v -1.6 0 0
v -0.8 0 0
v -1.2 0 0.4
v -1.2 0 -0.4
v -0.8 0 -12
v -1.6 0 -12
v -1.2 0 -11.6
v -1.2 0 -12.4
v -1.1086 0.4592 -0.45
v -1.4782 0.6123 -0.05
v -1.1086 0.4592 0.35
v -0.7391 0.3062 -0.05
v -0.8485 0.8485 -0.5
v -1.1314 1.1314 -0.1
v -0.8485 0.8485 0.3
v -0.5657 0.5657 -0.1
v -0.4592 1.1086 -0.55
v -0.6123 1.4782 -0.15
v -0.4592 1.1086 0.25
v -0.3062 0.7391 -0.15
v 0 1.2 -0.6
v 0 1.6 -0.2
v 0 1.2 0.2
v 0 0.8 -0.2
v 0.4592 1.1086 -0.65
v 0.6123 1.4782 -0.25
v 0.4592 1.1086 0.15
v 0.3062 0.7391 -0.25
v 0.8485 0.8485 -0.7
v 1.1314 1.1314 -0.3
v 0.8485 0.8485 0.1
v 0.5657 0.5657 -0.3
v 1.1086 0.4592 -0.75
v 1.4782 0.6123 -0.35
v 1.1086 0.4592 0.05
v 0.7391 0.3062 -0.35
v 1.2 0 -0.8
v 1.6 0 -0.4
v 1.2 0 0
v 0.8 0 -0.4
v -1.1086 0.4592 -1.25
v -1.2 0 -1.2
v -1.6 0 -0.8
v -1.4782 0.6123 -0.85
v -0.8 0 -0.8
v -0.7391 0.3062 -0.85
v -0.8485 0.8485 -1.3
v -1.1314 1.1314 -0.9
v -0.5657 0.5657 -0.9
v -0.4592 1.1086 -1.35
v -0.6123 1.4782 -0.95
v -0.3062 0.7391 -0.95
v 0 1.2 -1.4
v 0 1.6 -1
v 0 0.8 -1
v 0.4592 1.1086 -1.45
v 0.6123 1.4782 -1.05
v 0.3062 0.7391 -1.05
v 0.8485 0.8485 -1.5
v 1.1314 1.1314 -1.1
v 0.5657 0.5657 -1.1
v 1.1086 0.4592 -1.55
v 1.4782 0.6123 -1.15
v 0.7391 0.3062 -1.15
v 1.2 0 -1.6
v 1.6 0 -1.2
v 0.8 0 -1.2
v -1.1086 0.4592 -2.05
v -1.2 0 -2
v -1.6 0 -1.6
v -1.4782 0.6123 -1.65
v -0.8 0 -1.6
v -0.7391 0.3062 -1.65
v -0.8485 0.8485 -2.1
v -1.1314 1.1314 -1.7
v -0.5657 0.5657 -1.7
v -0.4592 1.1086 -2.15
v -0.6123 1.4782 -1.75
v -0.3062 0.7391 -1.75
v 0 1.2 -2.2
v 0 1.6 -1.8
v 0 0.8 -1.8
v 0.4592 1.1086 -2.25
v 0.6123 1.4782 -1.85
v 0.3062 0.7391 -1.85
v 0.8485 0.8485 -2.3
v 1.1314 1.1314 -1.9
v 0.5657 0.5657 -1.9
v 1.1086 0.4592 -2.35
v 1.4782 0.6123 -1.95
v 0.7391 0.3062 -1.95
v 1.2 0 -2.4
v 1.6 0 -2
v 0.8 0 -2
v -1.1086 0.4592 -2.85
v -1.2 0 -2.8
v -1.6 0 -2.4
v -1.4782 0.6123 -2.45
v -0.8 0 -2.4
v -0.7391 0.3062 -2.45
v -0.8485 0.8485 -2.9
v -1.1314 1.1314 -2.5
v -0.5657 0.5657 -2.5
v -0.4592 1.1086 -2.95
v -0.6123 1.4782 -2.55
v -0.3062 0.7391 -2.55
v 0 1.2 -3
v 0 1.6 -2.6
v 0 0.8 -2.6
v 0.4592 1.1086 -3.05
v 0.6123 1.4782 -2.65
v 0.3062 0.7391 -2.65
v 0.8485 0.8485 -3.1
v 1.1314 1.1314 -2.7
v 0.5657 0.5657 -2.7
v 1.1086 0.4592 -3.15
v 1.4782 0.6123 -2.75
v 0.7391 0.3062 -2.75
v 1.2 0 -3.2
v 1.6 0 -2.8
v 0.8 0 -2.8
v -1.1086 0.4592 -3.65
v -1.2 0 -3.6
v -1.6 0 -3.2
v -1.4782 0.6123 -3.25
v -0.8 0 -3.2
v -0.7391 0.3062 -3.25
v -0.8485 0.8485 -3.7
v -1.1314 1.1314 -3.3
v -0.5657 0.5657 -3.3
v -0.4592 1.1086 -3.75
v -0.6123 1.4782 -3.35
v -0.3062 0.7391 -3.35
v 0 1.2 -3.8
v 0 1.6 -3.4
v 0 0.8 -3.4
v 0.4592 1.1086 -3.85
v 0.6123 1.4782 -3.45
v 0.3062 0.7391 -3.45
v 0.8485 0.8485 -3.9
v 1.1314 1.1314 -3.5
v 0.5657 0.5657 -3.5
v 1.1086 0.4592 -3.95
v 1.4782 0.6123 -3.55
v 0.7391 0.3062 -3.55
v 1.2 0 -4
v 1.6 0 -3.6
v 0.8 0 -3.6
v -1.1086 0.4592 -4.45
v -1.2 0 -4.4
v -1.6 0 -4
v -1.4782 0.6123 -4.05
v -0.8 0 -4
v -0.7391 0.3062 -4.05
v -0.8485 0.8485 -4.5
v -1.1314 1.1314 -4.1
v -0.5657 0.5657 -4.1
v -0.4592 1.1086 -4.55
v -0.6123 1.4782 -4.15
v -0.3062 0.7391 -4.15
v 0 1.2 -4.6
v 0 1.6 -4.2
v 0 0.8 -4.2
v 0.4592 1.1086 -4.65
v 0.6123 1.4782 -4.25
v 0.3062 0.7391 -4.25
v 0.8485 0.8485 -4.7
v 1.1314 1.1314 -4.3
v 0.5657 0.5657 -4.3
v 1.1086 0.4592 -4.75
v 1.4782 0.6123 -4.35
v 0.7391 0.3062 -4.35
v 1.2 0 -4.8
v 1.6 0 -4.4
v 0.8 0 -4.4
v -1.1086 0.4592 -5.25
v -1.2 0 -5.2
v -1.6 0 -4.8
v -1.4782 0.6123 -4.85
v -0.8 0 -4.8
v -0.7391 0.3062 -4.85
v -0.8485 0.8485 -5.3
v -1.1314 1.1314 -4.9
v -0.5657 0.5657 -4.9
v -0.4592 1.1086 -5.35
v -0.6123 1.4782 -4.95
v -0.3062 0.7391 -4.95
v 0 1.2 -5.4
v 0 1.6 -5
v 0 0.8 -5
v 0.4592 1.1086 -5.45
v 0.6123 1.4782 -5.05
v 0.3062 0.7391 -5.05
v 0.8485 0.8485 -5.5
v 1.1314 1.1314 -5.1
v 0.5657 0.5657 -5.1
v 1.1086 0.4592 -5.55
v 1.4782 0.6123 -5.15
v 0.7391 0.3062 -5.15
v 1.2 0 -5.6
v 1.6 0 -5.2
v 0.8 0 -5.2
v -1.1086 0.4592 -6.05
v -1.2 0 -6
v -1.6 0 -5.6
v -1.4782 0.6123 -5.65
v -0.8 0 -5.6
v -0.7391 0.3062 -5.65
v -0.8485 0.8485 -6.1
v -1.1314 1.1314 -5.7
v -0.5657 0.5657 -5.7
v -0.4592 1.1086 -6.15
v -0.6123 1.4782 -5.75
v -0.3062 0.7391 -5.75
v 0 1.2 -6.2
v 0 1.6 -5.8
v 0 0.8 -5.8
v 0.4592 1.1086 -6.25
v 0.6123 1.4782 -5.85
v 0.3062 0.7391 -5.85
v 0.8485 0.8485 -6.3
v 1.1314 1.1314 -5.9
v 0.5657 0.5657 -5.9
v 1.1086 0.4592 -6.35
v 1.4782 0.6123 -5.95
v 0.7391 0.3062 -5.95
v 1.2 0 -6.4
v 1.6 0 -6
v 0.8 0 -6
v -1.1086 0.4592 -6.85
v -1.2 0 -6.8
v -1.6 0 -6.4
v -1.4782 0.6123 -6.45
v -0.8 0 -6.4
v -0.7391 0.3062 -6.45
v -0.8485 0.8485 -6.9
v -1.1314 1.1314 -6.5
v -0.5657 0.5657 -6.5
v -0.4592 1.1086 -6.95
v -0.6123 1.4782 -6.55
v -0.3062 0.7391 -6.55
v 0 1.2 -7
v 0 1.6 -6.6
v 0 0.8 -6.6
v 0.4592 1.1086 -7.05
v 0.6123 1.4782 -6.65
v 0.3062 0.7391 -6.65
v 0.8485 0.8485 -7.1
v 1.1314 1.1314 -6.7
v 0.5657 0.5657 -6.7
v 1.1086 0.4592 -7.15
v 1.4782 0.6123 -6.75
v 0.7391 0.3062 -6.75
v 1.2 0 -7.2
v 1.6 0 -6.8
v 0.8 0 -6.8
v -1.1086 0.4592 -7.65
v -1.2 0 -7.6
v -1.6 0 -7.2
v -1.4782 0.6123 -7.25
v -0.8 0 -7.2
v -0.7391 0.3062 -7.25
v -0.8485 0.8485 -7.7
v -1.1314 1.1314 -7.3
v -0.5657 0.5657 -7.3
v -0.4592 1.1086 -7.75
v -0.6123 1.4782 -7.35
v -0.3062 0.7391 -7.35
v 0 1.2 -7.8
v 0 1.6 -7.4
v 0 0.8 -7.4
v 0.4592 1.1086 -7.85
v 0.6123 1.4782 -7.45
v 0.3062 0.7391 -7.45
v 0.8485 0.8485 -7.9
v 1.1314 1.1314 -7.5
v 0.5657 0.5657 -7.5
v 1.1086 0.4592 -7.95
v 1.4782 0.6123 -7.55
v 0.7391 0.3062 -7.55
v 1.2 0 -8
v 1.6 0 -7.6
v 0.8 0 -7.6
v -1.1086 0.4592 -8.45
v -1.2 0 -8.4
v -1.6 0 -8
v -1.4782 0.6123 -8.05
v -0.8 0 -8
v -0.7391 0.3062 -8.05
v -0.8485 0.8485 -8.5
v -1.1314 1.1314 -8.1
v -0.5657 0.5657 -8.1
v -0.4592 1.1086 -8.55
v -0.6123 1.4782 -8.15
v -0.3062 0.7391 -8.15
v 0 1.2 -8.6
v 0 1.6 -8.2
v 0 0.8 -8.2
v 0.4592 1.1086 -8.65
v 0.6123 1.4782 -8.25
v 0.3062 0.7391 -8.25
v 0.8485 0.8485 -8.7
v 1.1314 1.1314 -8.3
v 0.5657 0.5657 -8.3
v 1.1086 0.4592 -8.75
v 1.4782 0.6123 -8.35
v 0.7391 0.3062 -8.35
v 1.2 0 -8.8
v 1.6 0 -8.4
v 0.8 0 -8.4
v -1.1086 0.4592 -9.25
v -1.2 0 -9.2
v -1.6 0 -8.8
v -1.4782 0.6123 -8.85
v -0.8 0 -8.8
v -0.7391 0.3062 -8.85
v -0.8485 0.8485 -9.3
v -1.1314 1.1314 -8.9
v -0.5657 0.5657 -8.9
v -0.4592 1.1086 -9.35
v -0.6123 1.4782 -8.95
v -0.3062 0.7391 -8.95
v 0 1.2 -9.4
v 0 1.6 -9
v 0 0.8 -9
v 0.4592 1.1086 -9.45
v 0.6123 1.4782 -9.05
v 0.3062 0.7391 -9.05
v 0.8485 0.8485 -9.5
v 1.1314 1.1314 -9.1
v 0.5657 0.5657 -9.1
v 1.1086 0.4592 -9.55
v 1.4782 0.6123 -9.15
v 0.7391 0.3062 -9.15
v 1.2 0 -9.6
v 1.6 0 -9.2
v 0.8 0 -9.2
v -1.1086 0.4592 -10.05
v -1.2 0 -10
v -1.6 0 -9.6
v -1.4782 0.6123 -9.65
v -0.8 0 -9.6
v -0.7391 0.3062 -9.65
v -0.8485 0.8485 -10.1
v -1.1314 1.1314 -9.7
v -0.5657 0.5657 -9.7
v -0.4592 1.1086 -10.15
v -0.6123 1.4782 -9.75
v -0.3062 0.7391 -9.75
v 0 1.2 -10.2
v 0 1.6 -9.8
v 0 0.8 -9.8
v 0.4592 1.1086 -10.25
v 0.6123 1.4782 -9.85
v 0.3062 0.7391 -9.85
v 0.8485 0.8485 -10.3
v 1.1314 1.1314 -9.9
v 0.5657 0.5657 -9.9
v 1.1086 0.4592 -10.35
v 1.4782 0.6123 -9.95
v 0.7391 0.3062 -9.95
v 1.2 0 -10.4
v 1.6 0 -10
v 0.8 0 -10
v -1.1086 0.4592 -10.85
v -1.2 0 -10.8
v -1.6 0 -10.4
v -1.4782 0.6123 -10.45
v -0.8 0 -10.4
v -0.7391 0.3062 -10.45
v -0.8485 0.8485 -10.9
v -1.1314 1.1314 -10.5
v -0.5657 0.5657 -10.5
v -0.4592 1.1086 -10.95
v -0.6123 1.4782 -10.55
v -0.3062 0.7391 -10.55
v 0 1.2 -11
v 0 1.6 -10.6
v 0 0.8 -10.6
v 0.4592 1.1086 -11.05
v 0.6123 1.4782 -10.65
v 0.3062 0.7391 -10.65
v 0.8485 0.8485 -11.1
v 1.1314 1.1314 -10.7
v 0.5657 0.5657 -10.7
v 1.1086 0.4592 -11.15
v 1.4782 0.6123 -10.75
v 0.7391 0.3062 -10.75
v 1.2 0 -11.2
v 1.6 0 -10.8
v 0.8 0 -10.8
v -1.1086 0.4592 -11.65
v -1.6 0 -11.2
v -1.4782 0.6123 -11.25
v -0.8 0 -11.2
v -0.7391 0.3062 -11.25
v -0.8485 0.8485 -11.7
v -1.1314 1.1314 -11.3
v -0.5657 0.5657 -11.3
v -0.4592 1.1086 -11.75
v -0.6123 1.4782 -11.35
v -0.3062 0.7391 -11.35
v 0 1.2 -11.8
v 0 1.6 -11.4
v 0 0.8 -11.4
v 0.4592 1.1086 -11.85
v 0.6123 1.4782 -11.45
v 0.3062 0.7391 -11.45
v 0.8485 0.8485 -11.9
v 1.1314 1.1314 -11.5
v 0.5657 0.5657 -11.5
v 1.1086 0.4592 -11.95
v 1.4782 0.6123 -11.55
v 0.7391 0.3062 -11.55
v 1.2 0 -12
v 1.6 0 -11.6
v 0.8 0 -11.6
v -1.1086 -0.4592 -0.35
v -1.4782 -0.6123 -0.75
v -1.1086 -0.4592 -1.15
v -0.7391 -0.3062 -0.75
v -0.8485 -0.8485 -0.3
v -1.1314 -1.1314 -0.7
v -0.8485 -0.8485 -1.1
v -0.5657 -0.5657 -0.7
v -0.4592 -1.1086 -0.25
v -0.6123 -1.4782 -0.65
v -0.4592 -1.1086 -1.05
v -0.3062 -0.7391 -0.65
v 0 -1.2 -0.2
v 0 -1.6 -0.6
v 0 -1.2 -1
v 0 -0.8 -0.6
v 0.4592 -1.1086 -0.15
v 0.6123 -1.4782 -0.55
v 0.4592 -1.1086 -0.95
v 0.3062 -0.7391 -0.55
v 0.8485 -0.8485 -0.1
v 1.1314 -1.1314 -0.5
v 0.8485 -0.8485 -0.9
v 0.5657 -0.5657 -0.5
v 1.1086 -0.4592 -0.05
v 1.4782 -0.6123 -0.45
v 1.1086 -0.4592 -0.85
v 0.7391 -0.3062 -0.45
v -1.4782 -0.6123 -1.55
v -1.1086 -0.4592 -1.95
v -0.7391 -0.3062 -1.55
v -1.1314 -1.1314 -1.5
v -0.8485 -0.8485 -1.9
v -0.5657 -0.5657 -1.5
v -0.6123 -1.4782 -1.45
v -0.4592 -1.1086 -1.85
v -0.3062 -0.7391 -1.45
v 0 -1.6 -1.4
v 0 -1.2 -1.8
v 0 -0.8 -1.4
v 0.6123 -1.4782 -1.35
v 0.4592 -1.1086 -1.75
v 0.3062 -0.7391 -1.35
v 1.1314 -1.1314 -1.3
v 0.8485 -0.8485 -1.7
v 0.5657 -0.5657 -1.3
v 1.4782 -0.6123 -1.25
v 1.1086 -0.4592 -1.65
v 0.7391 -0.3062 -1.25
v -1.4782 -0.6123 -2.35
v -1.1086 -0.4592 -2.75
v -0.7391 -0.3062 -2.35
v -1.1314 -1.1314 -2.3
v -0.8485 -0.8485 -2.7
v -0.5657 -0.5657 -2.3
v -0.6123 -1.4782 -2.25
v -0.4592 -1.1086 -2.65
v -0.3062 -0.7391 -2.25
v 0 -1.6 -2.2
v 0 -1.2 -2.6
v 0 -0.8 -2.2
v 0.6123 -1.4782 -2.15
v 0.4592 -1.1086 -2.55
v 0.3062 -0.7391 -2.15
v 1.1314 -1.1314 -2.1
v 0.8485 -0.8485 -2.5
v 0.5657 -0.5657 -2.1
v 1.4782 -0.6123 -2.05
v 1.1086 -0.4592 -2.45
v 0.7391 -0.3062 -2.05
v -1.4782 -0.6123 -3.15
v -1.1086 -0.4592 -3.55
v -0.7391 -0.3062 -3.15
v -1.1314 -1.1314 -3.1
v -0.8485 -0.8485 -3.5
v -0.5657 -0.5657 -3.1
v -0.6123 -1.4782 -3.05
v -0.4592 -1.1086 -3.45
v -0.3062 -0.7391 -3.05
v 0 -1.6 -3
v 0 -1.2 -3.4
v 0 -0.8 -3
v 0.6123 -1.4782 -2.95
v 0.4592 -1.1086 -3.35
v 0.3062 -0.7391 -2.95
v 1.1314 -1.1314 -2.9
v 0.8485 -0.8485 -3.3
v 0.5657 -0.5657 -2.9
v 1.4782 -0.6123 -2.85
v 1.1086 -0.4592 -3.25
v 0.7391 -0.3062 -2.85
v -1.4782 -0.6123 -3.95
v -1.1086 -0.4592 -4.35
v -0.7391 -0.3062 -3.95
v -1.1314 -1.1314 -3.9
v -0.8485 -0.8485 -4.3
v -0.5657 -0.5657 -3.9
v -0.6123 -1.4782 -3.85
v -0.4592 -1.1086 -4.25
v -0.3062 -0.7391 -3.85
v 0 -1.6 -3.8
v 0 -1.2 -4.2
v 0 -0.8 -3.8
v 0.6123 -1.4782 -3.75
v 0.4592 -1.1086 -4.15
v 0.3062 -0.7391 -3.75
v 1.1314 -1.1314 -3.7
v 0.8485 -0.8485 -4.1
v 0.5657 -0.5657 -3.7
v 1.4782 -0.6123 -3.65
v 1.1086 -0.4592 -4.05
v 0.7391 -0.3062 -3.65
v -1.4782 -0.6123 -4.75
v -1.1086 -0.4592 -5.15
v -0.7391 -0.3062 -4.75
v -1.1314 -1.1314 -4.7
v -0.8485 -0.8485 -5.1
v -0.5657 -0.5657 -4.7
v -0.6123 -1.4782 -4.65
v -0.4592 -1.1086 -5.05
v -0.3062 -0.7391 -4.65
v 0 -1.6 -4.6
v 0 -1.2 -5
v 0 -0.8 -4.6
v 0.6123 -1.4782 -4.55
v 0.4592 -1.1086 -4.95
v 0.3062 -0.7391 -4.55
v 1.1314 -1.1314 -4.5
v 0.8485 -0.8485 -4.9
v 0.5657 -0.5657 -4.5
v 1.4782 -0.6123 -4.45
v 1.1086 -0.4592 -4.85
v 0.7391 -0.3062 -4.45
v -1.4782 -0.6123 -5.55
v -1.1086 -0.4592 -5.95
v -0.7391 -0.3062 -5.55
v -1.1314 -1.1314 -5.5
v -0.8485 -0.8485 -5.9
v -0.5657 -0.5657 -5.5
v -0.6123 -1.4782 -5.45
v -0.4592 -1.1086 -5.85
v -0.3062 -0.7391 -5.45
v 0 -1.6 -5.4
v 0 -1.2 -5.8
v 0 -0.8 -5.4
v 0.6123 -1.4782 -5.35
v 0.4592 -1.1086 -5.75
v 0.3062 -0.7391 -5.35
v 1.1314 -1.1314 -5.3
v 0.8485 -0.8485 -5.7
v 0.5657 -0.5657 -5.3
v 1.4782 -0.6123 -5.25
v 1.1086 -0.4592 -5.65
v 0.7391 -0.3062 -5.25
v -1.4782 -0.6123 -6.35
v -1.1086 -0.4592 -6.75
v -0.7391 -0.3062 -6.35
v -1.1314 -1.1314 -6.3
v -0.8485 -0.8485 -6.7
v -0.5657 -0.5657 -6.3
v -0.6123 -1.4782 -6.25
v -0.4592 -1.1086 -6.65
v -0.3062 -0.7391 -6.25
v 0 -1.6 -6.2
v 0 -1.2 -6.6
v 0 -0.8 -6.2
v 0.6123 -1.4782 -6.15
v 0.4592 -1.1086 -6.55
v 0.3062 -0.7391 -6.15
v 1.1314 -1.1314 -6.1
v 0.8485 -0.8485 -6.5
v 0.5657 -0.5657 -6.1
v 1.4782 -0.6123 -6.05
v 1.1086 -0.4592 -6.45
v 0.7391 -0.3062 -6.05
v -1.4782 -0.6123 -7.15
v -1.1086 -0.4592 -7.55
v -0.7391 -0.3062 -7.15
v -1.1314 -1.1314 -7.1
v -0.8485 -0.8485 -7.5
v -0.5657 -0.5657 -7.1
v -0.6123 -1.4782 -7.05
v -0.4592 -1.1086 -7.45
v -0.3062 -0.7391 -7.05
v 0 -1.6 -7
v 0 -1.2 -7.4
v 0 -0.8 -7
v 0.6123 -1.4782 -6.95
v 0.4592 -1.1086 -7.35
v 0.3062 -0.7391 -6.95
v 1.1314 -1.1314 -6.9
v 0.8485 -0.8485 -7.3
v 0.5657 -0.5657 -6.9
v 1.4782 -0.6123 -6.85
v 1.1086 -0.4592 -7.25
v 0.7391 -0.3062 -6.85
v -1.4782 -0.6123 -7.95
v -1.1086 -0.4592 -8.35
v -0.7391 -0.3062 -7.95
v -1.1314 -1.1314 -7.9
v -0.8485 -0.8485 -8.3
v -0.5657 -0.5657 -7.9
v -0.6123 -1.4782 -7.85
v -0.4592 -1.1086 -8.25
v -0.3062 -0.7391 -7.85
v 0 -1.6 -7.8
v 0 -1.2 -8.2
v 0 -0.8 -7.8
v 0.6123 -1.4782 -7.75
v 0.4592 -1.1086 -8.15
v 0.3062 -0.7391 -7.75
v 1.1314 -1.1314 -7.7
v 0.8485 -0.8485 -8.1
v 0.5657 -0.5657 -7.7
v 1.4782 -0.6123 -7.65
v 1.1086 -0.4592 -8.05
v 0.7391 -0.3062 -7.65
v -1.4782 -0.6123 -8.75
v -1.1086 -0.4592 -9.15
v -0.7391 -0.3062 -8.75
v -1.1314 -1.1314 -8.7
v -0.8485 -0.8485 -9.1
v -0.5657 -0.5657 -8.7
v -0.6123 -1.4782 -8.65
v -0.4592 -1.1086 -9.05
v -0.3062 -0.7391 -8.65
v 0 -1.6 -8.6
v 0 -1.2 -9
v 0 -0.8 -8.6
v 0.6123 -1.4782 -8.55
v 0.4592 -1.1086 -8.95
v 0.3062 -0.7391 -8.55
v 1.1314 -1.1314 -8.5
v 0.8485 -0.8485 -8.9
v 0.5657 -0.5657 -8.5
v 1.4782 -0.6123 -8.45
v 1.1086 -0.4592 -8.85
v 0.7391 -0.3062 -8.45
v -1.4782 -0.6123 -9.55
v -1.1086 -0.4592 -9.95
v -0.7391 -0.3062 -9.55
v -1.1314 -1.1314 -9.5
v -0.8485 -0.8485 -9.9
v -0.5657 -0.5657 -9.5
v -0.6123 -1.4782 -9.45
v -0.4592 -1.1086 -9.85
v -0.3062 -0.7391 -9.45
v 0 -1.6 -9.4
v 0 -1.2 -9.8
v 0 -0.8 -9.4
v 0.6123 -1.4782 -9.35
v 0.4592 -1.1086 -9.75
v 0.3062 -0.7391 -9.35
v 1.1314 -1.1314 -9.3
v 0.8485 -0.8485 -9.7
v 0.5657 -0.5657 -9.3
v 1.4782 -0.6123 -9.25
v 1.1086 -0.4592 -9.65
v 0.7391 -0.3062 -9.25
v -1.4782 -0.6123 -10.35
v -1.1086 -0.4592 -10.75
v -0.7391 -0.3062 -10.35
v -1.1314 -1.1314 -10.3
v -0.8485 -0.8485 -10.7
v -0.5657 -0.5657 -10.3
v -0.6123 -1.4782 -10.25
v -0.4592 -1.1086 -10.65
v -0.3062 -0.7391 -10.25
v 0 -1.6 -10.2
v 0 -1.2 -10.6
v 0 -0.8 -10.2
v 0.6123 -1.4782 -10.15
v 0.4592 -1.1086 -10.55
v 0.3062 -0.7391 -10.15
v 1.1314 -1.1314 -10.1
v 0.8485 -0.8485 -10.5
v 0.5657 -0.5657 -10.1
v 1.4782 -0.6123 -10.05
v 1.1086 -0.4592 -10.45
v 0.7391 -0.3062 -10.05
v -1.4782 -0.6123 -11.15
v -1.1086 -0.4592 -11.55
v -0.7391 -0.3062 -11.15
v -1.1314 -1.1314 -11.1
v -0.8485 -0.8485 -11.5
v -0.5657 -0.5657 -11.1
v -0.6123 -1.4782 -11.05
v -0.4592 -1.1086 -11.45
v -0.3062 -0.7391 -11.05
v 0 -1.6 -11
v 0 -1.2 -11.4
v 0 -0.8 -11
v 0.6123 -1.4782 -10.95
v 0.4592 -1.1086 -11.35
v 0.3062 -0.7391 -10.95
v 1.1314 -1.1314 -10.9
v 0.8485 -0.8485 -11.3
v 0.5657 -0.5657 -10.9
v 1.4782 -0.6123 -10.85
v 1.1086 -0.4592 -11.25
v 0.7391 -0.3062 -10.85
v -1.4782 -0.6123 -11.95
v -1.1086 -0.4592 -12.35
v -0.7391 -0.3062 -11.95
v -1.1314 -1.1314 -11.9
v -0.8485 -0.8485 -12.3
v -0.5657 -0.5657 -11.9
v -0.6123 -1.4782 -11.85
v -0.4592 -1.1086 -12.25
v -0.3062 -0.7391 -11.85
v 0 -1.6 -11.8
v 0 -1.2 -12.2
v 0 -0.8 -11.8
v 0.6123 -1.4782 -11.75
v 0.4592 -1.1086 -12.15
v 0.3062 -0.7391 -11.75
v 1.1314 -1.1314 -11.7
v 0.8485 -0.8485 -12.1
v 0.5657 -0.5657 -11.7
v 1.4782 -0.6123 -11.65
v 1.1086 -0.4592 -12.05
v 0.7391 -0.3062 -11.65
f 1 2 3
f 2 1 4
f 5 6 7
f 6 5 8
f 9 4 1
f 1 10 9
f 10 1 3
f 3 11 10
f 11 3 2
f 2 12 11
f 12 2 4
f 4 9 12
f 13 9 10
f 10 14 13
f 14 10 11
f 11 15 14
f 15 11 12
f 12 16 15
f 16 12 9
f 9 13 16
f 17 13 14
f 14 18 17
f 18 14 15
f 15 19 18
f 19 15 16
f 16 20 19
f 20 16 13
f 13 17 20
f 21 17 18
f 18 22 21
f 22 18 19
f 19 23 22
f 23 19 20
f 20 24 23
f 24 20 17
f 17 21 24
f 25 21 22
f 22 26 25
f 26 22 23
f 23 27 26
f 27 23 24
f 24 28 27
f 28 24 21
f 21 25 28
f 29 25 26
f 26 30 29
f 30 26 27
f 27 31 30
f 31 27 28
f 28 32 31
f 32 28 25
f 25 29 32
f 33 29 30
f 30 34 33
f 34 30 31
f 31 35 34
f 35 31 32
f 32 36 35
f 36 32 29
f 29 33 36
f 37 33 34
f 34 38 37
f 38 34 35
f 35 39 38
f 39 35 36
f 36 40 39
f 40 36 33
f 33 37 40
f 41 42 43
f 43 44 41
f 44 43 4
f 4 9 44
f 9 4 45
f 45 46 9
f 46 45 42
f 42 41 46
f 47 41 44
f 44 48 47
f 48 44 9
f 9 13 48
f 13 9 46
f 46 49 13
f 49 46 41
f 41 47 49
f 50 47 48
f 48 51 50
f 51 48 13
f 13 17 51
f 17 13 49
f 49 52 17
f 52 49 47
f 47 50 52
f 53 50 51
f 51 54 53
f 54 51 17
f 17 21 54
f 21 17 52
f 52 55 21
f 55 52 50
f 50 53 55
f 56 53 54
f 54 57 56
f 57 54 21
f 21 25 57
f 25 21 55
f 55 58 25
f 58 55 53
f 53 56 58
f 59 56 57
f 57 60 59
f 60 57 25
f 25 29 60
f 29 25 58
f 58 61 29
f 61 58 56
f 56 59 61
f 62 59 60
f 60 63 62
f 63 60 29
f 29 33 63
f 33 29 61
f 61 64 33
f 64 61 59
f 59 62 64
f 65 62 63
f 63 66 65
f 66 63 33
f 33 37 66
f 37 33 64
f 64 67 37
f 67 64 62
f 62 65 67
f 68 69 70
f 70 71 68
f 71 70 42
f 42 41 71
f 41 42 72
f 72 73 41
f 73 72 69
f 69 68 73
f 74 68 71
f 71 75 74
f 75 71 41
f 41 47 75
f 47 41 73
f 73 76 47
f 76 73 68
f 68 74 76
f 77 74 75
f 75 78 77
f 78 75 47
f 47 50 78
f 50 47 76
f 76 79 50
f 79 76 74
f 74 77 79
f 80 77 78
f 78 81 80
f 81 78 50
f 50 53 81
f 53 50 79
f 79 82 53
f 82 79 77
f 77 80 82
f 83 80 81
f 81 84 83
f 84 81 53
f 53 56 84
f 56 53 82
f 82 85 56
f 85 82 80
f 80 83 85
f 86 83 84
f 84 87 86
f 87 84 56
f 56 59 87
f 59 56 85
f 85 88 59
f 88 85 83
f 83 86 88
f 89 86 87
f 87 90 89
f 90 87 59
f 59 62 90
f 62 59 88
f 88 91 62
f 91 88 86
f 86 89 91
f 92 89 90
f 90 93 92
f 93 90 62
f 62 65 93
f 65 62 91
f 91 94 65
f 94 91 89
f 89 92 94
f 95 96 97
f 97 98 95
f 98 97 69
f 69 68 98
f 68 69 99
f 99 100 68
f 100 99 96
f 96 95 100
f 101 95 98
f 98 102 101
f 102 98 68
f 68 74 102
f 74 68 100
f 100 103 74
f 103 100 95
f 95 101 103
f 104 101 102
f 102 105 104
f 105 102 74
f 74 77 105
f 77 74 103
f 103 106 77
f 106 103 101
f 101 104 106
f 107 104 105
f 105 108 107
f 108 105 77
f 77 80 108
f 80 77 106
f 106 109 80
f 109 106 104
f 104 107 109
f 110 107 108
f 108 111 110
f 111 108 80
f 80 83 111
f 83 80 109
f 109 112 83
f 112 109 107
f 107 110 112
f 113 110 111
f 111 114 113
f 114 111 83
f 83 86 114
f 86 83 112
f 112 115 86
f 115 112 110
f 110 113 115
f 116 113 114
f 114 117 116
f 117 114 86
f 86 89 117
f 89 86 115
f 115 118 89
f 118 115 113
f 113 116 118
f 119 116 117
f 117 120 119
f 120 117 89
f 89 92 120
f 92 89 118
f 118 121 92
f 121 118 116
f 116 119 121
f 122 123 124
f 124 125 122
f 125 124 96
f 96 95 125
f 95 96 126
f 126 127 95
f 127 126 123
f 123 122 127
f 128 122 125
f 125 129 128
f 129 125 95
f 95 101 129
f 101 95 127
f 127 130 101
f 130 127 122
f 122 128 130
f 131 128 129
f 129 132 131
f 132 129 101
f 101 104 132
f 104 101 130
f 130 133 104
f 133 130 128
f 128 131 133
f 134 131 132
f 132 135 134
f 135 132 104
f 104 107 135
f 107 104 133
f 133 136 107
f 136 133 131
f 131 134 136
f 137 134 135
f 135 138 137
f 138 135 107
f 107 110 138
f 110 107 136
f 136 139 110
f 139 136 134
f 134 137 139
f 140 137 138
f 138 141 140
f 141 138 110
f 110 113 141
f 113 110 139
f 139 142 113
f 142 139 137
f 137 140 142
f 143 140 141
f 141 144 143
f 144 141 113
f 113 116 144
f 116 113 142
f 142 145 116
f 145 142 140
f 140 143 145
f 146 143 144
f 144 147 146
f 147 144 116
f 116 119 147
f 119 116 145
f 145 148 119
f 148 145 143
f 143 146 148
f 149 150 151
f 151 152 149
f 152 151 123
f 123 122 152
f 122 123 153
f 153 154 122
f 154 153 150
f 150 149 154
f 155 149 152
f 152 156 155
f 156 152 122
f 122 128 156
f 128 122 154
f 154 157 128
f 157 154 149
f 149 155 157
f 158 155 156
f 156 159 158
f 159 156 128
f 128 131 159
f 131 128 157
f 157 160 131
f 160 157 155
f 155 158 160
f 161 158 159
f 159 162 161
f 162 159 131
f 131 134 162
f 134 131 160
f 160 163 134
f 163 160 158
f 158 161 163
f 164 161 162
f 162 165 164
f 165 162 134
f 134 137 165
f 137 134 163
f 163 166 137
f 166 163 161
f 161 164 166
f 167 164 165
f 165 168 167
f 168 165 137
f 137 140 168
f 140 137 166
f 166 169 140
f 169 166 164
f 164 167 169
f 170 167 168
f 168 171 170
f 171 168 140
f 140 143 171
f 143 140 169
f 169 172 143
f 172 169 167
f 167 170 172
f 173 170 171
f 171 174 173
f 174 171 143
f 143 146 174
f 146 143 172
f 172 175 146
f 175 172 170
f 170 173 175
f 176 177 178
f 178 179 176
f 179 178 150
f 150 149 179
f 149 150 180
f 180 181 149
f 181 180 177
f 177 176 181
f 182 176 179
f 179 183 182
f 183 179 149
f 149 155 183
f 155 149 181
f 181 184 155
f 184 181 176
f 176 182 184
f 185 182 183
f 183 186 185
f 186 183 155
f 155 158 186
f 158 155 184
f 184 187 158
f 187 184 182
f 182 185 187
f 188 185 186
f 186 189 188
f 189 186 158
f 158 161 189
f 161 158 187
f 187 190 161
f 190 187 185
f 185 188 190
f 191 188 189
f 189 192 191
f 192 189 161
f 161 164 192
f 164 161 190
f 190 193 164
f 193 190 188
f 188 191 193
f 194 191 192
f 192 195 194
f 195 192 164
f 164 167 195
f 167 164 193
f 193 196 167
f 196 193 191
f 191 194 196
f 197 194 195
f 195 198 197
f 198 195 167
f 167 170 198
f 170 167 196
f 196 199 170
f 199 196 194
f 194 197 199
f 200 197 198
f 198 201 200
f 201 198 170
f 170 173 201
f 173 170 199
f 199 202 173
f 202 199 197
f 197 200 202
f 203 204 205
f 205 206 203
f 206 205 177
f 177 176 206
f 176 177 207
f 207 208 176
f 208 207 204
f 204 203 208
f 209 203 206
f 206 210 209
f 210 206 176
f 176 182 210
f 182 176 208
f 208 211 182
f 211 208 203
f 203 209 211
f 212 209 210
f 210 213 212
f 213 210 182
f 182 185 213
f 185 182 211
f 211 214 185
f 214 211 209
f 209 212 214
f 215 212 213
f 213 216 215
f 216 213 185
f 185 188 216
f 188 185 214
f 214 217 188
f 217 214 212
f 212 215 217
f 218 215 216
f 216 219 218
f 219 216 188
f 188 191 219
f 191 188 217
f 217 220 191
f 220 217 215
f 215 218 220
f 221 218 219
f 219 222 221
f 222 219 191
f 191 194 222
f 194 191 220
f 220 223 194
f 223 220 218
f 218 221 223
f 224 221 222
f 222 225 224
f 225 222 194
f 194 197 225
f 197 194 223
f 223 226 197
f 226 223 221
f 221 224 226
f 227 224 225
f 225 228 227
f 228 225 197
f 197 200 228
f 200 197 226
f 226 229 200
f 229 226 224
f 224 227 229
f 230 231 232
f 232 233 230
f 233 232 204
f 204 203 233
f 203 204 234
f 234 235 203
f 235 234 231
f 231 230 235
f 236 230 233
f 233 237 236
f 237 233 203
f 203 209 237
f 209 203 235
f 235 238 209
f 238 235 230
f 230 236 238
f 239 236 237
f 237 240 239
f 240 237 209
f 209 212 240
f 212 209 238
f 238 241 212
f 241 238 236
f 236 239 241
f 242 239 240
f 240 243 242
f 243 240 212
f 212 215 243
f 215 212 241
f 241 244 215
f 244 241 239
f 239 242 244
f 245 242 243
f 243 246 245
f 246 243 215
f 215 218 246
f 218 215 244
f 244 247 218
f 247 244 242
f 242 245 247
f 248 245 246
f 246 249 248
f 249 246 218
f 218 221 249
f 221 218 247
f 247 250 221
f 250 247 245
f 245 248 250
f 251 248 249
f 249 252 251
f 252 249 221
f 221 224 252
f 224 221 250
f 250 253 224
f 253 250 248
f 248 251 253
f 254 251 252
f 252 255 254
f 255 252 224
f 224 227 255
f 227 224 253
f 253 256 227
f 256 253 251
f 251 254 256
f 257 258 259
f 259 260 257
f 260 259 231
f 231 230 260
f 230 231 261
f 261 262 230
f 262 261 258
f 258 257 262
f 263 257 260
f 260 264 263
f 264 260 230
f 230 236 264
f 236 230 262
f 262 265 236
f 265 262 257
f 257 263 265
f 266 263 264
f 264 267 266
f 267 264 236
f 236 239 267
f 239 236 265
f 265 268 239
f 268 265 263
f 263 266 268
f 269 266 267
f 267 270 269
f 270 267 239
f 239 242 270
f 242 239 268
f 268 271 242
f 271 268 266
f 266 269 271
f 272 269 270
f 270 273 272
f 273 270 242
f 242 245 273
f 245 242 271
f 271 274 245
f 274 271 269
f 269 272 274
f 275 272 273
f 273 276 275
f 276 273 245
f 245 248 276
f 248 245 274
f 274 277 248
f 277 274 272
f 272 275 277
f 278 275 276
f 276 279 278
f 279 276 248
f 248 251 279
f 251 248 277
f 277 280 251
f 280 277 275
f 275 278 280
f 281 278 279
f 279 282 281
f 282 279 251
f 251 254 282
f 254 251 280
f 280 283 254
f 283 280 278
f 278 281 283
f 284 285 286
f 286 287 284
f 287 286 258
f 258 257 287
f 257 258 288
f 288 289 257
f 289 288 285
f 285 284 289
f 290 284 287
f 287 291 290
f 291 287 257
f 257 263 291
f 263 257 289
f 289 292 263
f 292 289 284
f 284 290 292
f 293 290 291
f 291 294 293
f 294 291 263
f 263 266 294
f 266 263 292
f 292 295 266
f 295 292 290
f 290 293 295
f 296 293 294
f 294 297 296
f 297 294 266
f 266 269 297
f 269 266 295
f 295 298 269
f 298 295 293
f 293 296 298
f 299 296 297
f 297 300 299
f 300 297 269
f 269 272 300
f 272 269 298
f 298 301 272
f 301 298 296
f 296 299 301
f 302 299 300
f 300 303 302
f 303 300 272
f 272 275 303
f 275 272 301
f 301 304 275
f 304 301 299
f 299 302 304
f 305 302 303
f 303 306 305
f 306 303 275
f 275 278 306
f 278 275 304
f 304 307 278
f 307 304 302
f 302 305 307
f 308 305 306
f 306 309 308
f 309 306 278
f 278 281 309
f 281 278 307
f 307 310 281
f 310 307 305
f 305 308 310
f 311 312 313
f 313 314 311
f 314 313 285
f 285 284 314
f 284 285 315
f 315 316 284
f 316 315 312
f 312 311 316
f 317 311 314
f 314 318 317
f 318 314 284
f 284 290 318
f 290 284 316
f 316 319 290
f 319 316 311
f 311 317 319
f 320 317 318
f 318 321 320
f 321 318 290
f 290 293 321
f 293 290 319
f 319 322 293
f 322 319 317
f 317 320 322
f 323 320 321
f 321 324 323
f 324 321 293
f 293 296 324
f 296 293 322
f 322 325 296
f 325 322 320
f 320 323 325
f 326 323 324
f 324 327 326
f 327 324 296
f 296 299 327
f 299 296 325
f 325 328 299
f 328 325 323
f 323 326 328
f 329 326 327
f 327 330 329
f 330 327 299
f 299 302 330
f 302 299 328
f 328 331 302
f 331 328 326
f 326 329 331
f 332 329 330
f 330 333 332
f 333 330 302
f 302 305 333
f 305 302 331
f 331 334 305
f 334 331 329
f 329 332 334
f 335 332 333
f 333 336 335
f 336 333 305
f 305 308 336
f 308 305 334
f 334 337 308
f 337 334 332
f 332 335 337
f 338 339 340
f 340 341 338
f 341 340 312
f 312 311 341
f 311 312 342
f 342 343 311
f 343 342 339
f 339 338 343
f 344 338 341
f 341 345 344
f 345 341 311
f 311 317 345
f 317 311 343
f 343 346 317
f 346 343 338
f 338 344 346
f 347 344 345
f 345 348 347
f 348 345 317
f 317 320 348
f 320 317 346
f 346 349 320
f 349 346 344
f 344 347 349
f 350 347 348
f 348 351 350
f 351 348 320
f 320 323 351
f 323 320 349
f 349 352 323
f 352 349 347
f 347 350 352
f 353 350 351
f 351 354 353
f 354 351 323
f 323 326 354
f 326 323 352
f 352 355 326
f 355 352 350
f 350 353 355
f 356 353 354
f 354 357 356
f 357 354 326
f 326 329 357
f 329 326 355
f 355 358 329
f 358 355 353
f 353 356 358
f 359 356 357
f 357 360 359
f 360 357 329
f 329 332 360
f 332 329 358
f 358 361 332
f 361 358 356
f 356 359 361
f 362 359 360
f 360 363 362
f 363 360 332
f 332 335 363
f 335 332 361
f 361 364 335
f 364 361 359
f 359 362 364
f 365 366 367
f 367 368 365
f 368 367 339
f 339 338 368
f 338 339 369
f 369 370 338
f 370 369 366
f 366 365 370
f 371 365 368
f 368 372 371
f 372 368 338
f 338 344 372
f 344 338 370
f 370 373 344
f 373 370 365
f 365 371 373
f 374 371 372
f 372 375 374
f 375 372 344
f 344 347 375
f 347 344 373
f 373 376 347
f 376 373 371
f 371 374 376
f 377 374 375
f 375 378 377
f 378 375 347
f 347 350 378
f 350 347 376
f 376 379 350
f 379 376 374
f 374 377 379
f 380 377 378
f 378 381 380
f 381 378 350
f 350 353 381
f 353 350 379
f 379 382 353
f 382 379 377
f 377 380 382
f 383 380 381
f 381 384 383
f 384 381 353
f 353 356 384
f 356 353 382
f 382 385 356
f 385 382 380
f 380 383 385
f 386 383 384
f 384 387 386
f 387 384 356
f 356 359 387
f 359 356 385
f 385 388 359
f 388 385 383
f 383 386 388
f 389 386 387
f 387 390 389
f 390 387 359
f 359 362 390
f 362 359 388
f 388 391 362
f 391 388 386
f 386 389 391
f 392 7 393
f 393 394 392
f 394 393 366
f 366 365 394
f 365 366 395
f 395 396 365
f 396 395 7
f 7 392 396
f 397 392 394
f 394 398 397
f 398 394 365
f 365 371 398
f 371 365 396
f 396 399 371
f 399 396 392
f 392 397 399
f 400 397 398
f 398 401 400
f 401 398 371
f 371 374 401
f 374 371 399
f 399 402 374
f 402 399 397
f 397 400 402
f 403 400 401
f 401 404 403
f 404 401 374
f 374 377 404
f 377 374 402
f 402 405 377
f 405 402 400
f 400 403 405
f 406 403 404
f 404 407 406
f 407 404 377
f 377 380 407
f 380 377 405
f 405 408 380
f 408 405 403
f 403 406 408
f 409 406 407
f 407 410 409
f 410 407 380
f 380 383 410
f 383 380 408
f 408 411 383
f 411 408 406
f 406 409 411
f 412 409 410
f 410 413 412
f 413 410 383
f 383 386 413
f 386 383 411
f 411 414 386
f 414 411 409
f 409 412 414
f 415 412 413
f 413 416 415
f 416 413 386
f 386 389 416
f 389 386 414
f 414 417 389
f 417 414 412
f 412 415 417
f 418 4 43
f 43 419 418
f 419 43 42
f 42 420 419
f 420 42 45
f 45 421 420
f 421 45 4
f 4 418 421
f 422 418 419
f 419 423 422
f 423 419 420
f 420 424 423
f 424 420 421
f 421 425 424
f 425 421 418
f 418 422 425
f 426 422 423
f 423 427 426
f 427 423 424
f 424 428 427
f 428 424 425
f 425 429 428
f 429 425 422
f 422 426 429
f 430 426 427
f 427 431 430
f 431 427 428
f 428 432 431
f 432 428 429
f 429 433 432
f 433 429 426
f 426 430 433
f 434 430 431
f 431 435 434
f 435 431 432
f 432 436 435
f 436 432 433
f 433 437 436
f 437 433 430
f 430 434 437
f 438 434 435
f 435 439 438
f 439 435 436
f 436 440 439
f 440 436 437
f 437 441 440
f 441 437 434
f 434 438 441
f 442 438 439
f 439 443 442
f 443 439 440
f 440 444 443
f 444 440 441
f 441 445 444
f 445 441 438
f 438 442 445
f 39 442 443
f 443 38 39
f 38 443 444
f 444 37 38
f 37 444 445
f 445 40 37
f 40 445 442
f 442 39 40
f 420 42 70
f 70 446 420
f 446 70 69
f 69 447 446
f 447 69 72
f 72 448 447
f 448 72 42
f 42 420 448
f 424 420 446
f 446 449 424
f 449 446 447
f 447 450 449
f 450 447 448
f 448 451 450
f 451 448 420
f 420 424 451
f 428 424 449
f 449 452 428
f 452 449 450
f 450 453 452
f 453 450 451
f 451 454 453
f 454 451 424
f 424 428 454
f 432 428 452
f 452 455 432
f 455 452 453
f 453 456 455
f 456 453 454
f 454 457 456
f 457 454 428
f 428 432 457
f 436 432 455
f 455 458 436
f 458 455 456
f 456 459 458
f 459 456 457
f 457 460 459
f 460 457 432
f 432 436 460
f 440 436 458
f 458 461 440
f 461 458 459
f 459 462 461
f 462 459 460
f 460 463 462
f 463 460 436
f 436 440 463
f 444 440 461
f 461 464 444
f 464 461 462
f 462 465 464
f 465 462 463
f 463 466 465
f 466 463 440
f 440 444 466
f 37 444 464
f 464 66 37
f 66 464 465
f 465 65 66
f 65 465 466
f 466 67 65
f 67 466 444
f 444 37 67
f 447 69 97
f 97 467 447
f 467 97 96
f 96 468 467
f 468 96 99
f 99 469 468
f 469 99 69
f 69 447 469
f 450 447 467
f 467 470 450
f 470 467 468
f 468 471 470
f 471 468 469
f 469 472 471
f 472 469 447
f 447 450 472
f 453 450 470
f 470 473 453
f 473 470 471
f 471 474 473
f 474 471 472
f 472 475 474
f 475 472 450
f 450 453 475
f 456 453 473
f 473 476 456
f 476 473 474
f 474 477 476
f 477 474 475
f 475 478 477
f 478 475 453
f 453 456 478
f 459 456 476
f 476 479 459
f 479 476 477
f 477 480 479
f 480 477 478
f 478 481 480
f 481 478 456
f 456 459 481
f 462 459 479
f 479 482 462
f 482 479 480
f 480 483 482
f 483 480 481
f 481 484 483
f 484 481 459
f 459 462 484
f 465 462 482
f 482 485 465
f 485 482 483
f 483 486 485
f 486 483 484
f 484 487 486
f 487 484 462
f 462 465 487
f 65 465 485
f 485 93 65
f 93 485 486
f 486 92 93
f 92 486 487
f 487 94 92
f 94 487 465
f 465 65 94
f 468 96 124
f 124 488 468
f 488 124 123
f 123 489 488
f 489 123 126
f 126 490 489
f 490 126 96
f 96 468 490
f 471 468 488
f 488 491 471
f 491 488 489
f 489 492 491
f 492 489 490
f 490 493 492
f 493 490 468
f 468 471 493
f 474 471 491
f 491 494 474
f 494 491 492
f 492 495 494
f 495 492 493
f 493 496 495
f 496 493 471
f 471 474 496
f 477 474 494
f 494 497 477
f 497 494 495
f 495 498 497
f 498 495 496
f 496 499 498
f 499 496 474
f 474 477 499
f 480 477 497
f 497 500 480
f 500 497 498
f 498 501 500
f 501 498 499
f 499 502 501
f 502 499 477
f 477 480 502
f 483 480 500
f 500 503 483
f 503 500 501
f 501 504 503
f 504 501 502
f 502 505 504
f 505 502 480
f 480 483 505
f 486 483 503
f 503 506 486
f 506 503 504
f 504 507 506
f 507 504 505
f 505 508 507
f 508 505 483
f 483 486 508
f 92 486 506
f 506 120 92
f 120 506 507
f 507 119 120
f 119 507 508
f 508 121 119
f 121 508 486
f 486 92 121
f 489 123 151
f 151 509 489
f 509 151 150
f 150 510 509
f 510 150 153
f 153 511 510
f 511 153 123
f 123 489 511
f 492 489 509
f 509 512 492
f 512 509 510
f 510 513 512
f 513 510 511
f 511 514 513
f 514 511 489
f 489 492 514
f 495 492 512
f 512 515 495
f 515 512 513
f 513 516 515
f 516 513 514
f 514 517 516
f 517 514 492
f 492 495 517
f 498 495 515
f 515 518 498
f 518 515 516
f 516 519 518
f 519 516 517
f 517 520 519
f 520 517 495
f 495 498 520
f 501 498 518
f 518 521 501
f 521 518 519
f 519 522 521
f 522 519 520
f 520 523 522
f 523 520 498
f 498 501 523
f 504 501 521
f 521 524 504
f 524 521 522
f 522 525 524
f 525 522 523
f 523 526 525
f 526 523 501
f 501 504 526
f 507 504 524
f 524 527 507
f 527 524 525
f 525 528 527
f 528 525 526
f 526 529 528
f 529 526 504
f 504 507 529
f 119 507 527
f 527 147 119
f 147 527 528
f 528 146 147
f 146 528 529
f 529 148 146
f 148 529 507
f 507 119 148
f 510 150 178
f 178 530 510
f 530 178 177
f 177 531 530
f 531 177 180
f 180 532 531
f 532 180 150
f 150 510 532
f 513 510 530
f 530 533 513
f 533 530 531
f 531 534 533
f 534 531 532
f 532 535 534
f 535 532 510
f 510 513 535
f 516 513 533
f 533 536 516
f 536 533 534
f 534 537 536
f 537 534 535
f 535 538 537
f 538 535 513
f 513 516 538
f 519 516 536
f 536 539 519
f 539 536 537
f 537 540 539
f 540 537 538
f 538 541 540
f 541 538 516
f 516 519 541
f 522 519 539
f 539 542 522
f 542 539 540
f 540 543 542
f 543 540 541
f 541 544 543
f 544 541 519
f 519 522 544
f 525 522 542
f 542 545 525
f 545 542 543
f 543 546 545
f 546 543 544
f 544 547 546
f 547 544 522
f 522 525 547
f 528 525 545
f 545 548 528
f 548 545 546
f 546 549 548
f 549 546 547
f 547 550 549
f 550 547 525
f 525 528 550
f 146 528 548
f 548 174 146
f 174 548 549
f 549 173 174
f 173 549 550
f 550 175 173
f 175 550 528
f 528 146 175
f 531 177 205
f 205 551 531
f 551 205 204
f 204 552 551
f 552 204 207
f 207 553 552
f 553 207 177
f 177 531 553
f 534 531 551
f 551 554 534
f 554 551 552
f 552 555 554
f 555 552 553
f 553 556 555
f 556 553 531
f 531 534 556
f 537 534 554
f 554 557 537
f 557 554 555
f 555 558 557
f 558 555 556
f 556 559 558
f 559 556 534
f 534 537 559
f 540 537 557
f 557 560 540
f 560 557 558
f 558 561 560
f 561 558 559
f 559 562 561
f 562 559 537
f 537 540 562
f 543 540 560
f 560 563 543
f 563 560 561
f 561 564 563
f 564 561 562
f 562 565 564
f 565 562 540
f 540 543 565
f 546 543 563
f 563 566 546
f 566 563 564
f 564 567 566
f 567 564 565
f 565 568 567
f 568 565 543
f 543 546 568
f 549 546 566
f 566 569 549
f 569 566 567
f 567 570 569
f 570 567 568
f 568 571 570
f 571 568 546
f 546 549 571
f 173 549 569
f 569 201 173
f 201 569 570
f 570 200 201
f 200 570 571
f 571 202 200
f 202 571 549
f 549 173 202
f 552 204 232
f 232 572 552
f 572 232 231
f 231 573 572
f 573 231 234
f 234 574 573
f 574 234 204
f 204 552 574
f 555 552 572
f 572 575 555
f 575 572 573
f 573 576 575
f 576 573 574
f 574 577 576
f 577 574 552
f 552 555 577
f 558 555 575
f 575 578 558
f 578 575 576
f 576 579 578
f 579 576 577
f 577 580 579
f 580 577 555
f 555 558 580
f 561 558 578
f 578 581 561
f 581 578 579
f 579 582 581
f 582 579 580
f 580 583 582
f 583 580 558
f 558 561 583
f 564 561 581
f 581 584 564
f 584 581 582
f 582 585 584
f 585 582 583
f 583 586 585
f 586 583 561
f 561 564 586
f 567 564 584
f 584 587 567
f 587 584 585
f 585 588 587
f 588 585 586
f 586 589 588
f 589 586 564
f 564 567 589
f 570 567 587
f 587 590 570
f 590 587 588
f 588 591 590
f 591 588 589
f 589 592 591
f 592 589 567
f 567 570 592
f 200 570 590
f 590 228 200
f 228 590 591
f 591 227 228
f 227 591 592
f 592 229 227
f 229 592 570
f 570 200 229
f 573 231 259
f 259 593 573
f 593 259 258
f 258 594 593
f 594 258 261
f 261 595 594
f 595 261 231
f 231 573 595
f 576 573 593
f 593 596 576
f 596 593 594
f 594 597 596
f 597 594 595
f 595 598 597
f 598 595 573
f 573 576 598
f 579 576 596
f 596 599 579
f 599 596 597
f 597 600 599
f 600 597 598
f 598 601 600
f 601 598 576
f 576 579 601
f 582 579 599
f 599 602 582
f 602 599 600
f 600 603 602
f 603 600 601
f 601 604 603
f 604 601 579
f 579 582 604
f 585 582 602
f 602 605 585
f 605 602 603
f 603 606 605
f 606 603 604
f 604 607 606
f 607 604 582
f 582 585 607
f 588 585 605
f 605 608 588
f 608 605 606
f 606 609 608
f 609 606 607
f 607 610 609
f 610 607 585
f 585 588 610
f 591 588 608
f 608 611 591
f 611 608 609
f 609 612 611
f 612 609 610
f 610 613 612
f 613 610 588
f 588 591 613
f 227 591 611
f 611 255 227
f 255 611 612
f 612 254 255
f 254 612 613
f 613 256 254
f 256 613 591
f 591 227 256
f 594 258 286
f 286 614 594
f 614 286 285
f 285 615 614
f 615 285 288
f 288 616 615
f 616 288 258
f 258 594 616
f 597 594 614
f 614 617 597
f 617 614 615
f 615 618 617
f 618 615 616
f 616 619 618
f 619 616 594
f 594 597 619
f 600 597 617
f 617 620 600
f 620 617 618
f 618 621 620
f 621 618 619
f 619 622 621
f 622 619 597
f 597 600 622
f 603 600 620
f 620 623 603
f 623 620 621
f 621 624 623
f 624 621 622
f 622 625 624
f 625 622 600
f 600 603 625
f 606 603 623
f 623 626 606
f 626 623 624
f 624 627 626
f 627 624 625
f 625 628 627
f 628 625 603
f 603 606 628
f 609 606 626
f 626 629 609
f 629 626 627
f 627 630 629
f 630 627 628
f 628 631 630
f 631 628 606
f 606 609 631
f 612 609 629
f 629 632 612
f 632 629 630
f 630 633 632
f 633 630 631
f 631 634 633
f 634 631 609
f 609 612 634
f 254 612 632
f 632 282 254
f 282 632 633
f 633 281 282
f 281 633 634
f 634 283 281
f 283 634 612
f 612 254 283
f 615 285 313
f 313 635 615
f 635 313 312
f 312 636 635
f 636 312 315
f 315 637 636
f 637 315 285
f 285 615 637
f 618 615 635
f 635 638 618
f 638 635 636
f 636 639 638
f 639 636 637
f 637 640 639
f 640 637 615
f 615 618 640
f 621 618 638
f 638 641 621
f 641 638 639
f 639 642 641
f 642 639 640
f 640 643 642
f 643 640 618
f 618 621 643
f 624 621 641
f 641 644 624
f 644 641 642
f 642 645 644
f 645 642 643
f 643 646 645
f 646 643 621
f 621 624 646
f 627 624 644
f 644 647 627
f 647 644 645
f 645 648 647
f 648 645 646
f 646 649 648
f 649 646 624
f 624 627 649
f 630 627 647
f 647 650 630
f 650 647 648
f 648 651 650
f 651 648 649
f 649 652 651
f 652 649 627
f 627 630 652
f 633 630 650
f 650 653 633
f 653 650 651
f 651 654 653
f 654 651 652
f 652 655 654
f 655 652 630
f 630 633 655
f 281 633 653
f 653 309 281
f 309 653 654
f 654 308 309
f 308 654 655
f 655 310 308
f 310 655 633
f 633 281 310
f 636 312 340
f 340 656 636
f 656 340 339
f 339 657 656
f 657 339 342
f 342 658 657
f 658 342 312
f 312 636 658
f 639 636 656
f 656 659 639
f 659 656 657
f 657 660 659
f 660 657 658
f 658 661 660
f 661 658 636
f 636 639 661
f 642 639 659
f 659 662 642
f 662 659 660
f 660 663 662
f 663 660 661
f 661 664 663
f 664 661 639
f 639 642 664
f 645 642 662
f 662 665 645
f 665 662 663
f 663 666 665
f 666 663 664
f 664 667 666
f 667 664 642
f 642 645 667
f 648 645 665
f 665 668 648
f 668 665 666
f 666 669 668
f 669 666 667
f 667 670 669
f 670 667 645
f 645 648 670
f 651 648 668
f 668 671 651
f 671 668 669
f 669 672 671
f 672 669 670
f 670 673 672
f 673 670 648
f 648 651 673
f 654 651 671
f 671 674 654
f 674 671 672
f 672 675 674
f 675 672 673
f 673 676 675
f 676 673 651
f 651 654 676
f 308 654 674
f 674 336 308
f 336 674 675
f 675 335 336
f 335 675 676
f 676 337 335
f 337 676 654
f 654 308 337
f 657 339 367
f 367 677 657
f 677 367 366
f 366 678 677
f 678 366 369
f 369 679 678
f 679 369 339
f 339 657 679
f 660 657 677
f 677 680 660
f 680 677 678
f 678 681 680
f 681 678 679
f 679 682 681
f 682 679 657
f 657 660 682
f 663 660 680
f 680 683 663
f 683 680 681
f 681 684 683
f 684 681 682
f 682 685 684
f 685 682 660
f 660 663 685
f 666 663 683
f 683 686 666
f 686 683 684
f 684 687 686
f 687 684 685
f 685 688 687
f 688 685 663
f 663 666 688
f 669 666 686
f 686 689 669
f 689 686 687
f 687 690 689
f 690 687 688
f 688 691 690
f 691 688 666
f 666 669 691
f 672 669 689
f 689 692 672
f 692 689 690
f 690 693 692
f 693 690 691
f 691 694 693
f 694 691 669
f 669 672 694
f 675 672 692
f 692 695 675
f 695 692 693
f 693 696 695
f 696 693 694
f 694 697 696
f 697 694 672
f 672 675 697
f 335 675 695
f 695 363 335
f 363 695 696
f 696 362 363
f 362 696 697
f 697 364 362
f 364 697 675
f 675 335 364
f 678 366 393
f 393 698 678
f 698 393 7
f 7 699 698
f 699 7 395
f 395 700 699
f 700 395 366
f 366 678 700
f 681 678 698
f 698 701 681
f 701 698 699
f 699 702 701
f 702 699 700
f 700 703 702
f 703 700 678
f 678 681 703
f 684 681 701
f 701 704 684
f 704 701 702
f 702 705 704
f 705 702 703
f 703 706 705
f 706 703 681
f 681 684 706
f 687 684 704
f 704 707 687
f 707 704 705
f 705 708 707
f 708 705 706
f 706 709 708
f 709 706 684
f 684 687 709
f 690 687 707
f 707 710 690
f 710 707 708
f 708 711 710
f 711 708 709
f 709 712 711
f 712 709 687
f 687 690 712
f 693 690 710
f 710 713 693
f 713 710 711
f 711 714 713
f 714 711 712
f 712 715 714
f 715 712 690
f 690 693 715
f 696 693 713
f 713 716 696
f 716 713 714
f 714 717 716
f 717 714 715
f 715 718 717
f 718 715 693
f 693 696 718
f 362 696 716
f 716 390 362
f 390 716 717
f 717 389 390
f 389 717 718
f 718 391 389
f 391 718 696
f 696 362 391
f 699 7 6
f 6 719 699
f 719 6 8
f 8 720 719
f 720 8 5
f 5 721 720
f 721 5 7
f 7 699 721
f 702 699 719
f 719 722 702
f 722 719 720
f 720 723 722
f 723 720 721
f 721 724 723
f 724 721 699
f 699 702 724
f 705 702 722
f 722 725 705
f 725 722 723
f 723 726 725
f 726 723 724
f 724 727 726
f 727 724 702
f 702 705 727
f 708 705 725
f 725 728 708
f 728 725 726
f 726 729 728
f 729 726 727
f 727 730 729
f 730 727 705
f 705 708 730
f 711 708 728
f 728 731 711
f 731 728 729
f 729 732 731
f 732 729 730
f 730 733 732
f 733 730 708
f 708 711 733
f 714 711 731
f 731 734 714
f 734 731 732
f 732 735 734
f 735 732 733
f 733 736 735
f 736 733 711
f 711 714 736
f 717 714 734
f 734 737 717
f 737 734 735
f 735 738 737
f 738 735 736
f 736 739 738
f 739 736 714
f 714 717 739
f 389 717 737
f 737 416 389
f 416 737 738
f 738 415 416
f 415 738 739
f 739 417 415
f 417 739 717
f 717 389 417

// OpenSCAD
use <../lib.scad>
use <s/22706s01.scad>
function ldraw_lib__22706() = [
// 0 ~Minifig Stand Spring
// 0 Name: 22706.dat
// 0 Author: Philippe Hurbain [Philo]
// 0 !LDRAW_ORG Part UPDATE 2025-05
// 0 !LICENSE Licensed under CC BY 4.0 : see CAreadme.txt
// 
// 0 BFC CERTIFY CCW
  [0,"BFC","CERTIFY"],
  [0,"BFC","CCW"],
// 
// 0 !CATEGORY Minifig Accessory
// 0 !KEYWORDS Soccer, Sports
// 
// 0 !HISTORY 2024-10-27 [Holly-Wood] Added conds, subbed
// 0 !HISTORY 2025-05-28 [OrionP] Official Update 2025-05
// 
// 0 // Top
// 2 24 -3 -1 0 -4 0 0
  [2,24,-3,-1,0,-4,0,0],
// 2 24 -2 0 0 -3 -1 0
  [2,24,-2,0,0,-3,-1,0],
// 2 24 -3 1 0 -2 0 0
  [2,24,-3,1,0,-2,0,0],
// 2 24 -4 0 0 -3 1 0
  [2,24,-4,0,0,-3,1,0],
// 4 16 -3 1 0 -2 0 0 -3 -1 0 -4 0 0
  [4,16,-3,1,0,-2,0,0,-3,-1,0,-4,0,0],
// 
// 2 24 2.1213 .25 -2.1213 2.7716 .125 -1.1481
  [2,24,2.1213,.25,-2.1213,2.7716,.125,-1.1481],
// 2 24 -2.1213 .75 -2.1213 -1.1481 .625 -2.7716
  [2,24,-2.1213,.75,-2.1213,-1.1481,.625,-2.7716],
// 2 24 2.7716 .125 -1.1481 3 0 0
  [2,24,2.7716,.125,-1.1481,3,0,0],
// 2 24 -1.1481 .625 -2.7716 0 .5 -3
  [2,24,-1.1481,.625,-2.7716,0,.5,-3],
// 2 24 0 .5 -3 1.1481 .375 -2.7716
  [2,24,0,.5,-3,1.1481,.375,-2.7716],
// 2 24 -3 1 0 -2.7716 .875 -1.1481
  [2,24,-3,1,0,-2.7716,.875,-1.1481],
// 2 24 1.1481 .375 -2.7716 2.1213 .25 -2.1213
  [2,24,1.1481,.375,-2.7716,2.1213,.25,-2.1213],
// 2 24 -2.7716 .875 -1.1481 -2.1213 .75 -2.1213
  [2,24,-2.7716,.875,-1.1481,-2.1213,.75,-2.1213],
// 
// 0 // Bottom
// 2 24 -3 31 0 -4 30 0
  [2,24,-3,31,0,-4,30,0],
// 2 24 -3 29 0 -2 30 0
  [2,24,-3,29,0,-2,30,0],
// 2 24 -2 30 0 -3 31 0
  [2,24,-2,30,0,-3,31,0],
// 2 24 -4 30 0 -3 29 0
  [2,24,-4,30,0,-3,29,0],
// 4 16 -3 29 0 -2 30 0 -3 31 0 -4 30 0
  [4,16,-3,29,0,-2,30,0,-3,31,0,-4,30,0],
// 
// 2 24 -3 29 0 -2.7716 29.125 1.1481
  [2,24,-3,29,0,-2.7716,29.125,1.1481],
// 2 24 -2.7716 29.125 1.1481 -2.1213 29.25 2.1213
  [2,24,-2.7716,29.125,1.1481,-2.1213,29.25,2.1213],
// 2 24 -2.1213 29.25 2.1213 -1.1481 29.375 2.7716
  [2,24,-2.1213,29.25,2.1213,-1.1481,29.375,2.7716],
// 2 24 -1.1481 29.375 2.7716 0 29.5 3
  [2,24,-1.1481,29.375,2.7716,0,29.5,3],
// 2 24 0 29.5 3 1.1481 29.625 2.7716
  [2,24,0,29.5,3,1.1481,29.625,2.7716],
// 2 24 1.1481 29.625 2.7716 2.1213 29.75 2.1213
  [2,24,1.1481,29.625,2.7716,2.1213,29.75,2.1213],
// 2 24 2.1213 29.75 2.1213 2.7716 29.875 1.1481
  [2,24,2.1213,29.75,2.1213,2.7716,29.875,1.1481],
// 2 24 2.7716 29.875 1.1481 3 30 0
  [2,24,2.7716,29.875,1.1481,3,30,0],
// 
// 0 // Back
// 1 16 0 0 0 1 0 0 0 1 0 0 0 1 s\22706s01.dat
  [1,16,0,0,0,1,0,0,0,1,0,0,0,1, ldraw_lib__s__22706s01()],
// 1 16 0 2 0 1 0 0 0 1 0 0 0 1 s\22706s01.dat
  [1,16,0,2,0,1,0,0,0,1,0,0,0,1, ldraw_lib__s__22706s01()],
// 1 16 0 4 0 1 0 0 0 1 0 0 0 1 s\22706s01.dat
  [1,16,0,4,0,1,0,0,0,1,0,0,0,1, ldraw_lib__s__22706s01()],
// 1 16 0 6 0 1 0 0 0 1 0 0 0 1 s\22706s01.dat
  [1,16,0,6,0,1,0,0,0,1,0,0,0,1, ldraw_lib__s__22706s01()],
// 1 16 0 8 0 1 0 0 0 1 0 0 0 1 s\22706s01.dat
  [1,16,0,8,0,1,0,0,0,1,0,0,0,1, ldraw_lib__s__22706s01()],
// 1 16 0 10 0 1 0 0 0 1 0 0 0 1 s\22706s01.dat
  [1,16,0,10,0,1,0,0,0,1,0,0,0,1, ldraw_lib__s__22706s01()],
// 1 16 0 12 0 1 0 0 0 1 0 0 0 1 s\22706s01.dat
  [1,16,0,12,0,1,0,0,0,1,0,0,0,1, ldraw_lib__s__22706s01()],
// 1 16 0 14 0 1 0 0 0 1 0 0 0 1 s\22706s01.dat
  [1,16,0,14,0,1,0,0,0,1,0,0,0,1, ldraw_lib__s__22706s01()],
// 1 16 0 16 0 1 0 0 0 1 0 0 0 1 s\22706s01.dat
  [1,16,0,16,0,1,0,0,0,1,0,0,0,1, ldraw_lib__s__22706s01()],
// 1 16 0 18 0 1 0 0 0 1 0 0 0 1 s\22706s01.dat
  [1,16,0,18,0,1,0,0,0,1,0,0,0,1, ldraw_lib__s__22706s01()],
// 1 16 0 20 0 1 0 0 0 1 0 0 0 1 s\22706s01.dat
  [1,16,0,20,0,1,0,0,0,1,0,0,0,1, ldraw_lib__s__22706s01()],
// 1 16 0 22 0 1 0 0 0 1 0 0 0 1 s\22706s01.dat
  [1,16,0,22,0,1,0,0,0,1,0,0,0,1, ldraw_lib__s__22706s01()],
// 1 16 0 24 0 1 0 0 0 1 0 0 0 1 s\22706s01.dat
  [1,16,0,24,0,1,0,0,0,1,0,0,0,1, ldraw_lib__s__22706s01()],
// 1 16 0 26 0 1 0 0 0 1 0 0 0 1 s\22706s01.dat
  [1,16,0,26,0,1,0,0,0,1,0,0,0,1, ldraw_lib__s__22706s01()],
// 1 16 0 28 0 1 0 0 0 1 0 0 0 1 s\22706s01.dat
  [1,16,0,28,0,1,0,0,0,1,0,0,0,1, ldraw_lib__s__22706s01()],
// 
// 0 // Front
// 1 16 0 2 0 1 0 0 0 -1 0 0 0 -1 s\22706s01.dat
  [1,16,0,2,0,1,0,0,0,-1,0,0,0,-1, ldraw_lib__s__22706s01()],
// 1 16 0 4 0 1 0 0 0 -1 0 0 0 -1 s\22706s01.dat
  [1,16,0,4,0,1,0,0,0,-1,0,0,0,-1, ldraw_lib__s__22706s01()],
// 1 16 0 6 0 1 0 0 0 -1 0 0 0 -1 s\22706s01.dat
  [1,16,0,6,0,1,0,0,0,-1,0,0,0,-1, ldraw_lib__s__22706s01()],
// 1 16 0 8 0 1 0 0 0 -1 0 0 0 -1 s\22706s01.dat
  [1,16,0,8,0,1,0,0,0,-1,0,0,0,-1, ldraw_lib__s__22706s01()],
// 1 16 0 10 0 1 0 0 0 -1 0 0 0 -1 s\22706s01.dat
  [1,16,0,10,0,1,0,0,0,-1,0,0,0,-1, ldraw_lib__s__22706s01()],
// 1 16 0 12 0 1 0 0 0 -1 0 0 0 -1 s\22706s01.dat
  [1,16,0,12,0,1,0,0,0,-1,0,0,0,-1, ldraw_lib__s__22706s01()],
// 1 16 0 14 0 1 0 0 0 -1 0 0 0 -1 s\22706s01.dat
  [1,16,0,14,0,1,0,0,0,-1,0,0,0,-1, ldraw_lib__s__22706s01()],
// 1 16 0 16 0 1 0 0 0 -1 0 0 0 -1 s\22706s01.dat
  [1,16,0,16,0,1,0,0,0,-1,0,0,0,-1, ldraw_lib__s__22706s01()],
// 1 16 0 18 0 1 0 0 0 -1 0 0 0 -1 s\22706s01.dat
  [1,16,0,18,0,1,0,0,0,-1,0,0,0,-1, ldraw_lib__s__22706s01()],
// 1 16 0 20 0 1 0 0 0 -1 0 0 0 -1 s\22706s01.dat
  [1,16,0,20,0,1,0,0,0,-1,0,0,0,-1, ldraw_lib__s__22706s01()],
// 1 16 0 22 0 1 0 0 0 -1 0 0 0 -1 s\22706s01.dat
  [1,16,0,22,0,1,0,0,0,-1,0,0,0,-1, ldraw_lib__s__22706s01()],
// 1 16 0 24 0 1 0 0 0 -1 0 0 0 -1 s\22706s01.dat
  [1,16,0,24,0,1,0,0,0,-1,0,0,0,-1, ldraw_lib__s__22706s01()],
// 1 16 0 26 0 1 0 0 0 -1 0 0 0 -1 s\22706s01.dat
  [1,16,0,26,0,1,0,0,0,-1,0,0,0,-1, ldraw_lib__s__22706s01()],
// 1 16 0 28 0 1 0 0 0 -1 0 0 0 -1 s\22706s01.dat
  [1,16,0,28,0,1,0,0,0,-1,0,0,0,-1, ldraw_lib__s__22706s01()],
// 1 16 0 30 0 1 0 0 0 -1 0 0 0 -1 s\22706s01.dat
  [1,16,0,30,0,1,0,0,0,-1,0,0,0,-1, ldraw_lib__s__22706s01()],
];
module ldraw_lib__22706(step=0, col=false, unit=2/5, alt=false, line=0.2, solid=!$preview)
    makepoly(ldraw_lib__22706(), step=step, col=col, unit=unit, alt=alt, line=line, solid=solid);
ldraw_lib__22706(line=0.2);
